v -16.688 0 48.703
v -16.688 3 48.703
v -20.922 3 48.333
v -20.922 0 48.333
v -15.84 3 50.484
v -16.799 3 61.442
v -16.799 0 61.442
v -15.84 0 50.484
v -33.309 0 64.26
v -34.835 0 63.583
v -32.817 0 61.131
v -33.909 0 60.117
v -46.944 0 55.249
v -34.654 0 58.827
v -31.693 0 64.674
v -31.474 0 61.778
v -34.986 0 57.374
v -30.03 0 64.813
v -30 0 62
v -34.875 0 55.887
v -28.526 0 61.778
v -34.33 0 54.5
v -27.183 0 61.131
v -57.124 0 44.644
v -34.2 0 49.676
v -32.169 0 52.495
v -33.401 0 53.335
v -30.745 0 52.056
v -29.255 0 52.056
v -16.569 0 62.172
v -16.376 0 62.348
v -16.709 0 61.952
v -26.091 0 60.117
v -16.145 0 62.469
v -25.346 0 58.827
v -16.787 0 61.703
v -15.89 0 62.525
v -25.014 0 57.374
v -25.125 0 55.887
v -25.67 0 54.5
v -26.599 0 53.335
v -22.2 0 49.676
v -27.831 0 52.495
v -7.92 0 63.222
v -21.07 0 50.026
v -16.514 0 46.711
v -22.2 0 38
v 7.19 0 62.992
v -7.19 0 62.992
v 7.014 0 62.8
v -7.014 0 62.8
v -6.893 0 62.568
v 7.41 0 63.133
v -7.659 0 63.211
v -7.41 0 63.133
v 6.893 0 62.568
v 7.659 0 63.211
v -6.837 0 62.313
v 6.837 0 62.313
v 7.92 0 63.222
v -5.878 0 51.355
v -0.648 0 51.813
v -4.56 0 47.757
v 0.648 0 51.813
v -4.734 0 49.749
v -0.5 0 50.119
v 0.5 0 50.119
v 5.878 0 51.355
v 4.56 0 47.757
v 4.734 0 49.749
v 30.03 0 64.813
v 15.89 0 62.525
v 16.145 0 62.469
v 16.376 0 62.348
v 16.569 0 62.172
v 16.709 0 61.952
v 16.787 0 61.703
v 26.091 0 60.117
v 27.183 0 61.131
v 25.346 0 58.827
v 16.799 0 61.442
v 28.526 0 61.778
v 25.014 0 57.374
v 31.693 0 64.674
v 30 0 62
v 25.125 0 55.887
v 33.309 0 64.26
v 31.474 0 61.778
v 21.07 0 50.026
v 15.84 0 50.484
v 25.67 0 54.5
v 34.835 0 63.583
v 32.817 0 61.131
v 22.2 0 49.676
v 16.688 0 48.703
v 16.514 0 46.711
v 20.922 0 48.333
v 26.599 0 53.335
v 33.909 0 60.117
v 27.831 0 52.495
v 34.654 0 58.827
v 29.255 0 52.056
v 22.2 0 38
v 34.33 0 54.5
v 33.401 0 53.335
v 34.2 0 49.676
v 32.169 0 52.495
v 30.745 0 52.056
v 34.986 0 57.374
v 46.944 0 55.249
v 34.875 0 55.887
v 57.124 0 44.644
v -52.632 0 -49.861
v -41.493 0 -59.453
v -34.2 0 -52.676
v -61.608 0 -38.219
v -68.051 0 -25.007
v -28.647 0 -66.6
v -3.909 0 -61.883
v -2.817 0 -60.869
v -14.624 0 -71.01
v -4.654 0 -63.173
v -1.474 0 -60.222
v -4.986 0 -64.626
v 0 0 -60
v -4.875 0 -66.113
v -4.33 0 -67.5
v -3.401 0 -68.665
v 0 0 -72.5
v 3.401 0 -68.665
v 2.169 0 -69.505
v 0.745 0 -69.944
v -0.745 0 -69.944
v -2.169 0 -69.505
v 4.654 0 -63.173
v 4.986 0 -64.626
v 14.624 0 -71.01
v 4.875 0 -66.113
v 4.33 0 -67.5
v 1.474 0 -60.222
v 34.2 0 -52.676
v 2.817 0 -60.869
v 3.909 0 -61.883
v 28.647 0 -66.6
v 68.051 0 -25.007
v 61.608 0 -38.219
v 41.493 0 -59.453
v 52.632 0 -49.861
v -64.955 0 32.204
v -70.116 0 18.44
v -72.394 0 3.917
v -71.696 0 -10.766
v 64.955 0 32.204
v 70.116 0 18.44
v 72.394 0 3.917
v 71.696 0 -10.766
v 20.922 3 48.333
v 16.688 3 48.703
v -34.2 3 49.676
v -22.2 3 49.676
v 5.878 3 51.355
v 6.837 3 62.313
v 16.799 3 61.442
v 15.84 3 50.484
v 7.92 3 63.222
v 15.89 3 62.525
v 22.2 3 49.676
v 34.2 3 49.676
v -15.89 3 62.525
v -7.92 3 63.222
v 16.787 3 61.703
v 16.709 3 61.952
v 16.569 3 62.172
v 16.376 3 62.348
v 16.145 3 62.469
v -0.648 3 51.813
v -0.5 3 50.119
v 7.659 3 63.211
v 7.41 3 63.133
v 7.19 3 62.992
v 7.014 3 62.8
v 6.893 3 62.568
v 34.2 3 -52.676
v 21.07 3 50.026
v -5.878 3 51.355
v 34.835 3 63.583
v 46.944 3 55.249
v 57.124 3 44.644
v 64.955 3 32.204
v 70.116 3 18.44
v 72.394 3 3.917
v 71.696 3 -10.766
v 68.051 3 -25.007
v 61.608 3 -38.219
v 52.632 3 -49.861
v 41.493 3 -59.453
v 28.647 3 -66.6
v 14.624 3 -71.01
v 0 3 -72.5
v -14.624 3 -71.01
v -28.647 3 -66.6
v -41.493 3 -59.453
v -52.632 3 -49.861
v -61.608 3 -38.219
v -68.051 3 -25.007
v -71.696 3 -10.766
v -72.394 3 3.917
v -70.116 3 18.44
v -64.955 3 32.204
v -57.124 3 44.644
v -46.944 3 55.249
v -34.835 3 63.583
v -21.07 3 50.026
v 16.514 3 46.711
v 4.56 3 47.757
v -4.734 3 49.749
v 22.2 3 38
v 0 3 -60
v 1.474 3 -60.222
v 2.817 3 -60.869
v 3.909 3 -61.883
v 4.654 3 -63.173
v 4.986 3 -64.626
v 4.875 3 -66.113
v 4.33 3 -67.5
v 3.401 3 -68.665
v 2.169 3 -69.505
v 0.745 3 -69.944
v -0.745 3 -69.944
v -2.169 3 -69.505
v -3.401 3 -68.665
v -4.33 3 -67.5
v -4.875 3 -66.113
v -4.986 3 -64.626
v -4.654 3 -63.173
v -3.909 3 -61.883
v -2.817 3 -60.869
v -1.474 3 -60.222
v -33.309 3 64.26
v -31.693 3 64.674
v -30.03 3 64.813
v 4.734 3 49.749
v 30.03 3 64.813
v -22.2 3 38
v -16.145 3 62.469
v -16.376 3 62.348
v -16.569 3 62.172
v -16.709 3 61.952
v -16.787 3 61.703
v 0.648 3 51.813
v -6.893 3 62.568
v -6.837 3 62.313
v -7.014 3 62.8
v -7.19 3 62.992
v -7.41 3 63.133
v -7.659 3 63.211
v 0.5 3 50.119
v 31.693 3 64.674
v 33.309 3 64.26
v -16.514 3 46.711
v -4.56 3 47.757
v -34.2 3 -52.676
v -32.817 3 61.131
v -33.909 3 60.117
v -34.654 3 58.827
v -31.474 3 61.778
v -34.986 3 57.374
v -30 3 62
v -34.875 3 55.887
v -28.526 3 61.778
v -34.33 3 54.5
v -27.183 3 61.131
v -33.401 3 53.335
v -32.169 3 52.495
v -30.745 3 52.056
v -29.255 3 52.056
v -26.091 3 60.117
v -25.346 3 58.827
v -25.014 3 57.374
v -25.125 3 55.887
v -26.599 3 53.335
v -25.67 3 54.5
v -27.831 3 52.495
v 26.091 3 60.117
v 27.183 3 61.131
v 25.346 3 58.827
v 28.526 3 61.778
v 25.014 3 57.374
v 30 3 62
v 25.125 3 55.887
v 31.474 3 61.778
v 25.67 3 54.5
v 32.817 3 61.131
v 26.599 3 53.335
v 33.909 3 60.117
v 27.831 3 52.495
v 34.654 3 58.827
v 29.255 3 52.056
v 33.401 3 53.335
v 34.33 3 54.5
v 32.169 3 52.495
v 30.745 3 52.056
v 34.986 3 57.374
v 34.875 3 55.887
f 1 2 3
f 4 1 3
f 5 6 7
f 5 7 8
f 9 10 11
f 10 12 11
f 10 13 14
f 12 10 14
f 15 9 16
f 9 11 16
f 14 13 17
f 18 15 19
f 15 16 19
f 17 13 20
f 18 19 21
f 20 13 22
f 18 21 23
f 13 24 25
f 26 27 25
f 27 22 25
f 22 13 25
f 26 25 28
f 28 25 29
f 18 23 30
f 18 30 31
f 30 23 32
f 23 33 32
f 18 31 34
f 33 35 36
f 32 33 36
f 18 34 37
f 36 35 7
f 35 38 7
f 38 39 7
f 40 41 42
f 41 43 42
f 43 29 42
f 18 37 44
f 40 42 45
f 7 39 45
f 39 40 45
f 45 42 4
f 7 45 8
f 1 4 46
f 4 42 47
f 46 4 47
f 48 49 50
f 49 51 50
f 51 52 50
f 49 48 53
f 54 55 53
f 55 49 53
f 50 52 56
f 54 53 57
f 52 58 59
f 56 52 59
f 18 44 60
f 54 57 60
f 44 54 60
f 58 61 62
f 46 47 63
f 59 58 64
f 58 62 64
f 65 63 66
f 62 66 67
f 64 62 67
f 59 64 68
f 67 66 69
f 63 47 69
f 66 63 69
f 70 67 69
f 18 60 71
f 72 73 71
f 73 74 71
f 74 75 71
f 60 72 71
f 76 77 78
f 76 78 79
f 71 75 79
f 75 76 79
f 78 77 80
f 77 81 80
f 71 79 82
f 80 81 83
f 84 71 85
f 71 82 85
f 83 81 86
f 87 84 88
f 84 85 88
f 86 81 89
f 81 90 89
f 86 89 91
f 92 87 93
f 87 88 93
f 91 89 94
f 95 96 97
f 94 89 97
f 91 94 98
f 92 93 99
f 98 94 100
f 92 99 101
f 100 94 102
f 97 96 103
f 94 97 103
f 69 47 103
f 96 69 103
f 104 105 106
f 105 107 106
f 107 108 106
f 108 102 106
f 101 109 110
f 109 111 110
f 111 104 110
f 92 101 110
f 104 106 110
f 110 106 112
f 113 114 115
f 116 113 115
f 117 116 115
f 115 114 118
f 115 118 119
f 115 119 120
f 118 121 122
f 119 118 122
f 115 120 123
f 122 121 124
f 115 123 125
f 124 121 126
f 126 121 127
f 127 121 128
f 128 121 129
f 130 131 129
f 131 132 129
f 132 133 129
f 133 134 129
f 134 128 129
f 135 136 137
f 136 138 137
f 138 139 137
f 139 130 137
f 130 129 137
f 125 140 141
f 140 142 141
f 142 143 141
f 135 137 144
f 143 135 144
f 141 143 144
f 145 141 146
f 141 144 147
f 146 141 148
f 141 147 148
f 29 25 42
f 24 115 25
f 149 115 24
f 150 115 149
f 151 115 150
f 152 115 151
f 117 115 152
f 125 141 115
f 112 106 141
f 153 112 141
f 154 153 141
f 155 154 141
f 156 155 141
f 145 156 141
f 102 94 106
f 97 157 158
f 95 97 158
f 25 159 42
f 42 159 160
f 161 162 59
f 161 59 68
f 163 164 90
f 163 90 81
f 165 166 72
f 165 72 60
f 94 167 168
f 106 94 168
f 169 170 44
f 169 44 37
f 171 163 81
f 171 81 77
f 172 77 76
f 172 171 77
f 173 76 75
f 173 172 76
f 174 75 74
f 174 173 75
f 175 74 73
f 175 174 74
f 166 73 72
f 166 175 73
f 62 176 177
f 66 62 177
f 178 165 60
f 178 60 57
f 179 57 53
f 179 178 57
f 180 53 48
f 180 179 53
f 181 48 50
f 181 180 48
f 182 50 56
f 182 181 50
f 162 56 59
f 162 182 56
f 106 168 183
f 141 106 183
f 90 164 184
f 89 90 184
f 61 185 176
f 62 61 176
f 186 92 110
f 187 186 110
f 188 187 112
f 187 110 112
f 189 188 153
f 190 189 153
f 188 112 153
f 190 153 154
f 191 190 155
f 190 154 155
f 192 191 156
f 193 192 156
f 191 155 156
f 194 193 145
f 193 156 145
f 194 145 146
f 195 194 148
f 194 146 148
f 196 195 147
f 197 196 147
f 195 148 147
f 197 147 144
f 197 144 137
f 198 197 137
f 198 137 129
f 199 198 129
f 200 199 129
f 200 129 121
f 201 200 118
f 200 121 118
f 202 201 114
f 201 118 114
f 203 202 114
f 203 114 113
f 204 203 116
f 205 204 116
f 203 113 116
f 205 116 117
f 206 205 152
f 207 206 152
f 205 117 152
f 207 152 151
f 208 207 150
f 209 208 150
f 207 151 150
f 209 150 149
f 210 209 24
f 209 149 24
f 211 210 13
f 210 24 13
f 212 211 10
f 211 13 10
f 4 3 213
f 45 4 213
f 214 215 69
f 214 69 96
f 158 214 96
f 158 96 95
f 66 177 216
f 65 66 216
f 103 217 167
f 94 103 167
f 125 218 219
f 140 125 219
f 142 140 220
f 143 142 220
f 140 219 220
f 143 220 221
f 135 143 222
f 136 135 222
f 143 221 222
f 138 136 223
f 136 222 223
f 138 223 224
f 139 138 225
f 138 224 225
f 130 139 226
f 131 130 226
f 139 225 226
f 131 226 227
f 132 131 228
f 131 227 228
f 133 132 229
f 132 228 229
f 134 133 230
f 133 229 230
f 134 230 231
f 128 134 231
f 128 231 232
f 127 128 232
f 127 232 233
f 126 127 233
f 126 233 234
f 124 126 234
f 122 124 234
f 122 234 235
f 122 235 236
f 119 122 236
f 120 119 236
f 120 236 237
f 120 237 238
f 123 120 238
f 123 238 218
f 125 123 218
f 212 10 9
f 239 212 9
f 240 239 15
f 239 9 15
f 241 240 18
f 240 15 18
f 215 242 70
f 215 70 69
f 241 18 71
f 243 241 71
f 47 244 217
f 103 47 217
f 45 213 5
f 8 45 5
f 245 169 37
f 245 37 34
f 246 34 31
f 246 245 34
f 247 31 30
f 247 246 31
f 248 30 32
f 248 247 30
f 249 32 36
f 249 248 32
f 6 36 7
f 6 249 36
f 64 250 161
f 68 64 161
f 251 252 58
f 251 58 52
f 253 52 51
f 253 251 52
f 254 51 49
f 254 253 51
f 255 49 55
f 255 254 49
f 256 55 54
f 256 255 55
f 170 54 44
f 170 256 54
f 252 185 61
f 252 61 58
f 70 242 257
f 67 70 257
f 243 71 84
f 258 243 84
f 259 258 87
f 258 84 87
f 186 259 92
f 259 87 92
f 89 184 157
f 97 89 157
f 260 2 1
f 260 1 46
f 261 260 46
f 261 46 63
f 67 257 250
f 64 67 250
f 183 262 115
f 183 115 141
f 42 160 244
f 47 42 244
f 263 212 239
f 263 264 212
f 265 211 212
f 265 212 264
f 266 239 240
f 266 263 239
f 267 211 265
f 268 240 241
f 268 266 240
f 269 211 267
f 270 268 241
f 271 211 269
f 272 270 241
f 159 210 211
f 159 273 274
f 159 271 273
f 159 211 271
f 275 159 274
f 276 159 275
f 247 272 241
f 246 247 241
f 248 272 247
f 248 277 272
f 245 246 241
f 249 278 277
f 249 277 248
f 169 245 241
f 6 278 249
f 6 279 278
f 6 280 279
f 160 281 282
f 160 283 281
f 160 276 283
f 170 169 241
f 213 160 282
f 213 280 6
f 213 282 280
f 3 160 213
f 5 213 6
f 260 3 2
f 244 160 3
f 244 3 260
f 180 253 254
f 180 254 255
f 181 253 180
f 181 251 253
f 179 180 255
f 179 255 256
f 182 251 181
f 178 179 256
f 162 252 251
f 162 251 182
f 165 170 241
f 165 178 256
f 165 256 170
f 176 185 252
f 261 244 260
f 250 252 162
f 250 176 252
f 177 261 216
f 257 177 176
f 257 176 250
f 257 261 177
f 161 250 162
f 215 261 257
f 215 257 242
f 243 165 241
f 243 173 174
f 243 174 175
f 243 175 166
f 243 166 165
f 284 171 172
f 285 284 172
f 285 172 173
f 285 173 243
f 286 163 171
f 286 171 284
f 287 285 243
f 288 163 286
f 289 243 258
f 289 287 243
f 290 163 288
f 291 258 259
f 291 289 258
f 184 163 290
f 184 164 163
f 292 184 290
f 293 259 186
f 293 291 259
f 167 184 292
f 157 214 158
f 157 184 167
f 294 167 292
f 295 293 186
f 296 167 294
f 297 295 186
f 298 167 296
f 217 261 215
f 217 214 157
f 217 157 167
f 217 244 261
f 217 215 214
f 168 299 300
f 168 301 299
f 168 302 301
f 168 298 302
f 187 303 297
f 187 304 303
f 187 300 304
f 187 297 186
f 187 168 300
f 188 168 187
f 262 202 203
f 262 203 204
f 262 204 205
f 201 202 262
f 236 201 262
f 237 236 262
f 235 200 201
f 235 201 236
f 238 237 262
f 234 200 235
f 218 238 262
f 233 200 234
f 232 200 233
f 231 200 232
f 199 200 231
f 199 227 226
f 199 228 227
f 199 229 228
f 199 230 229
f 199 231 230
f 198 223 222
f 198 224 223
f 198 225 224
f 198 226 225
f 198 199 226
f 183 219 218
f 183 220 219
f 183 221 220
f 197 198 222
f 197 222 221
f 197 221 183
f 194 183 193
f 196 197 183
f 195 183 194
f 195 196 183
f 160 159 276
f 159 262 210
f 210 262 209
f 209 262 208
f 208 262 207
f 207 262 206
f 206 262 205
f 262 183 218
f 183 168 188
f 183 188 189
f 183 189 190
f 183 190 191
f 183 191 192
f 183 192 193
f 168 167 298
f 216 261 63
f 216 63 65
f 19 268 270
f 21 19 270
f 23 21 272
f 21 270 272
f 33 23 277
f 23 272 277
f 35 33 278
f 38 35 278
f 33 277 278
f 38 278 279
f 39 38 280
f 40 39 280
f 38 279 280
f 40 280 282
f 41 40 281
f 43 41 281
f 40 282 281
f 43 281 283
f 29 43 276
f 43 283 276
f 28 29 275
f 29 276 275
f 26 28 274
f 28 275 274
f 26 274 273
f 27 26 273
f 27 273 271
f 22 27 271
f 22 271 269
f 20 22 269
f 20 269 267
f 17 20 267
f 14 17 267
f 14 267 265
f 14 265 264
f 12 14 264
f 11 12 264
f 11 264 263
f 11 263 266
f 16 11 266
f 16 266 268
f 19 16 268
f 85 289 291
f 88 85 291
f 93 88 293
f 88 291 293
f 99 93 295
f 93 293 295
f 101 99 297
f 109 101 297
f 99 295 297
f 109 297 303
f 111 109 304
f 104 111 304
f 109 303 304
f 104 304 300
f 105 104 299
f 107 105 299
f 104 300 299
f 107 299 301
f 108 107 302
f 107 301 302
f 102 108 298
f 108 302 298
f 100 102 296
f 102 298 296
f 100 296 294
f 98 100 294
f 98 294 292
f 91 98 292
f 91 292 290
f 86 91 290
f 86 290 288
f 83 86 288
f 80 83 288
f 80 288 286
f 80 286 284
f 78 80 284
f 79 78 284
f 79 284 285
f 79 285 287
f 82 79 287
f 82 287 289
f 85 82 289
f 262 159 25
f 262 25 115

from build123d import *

# Parameters (mm, degrees)
BOSS_EXTRUDE1_DEPTH = 3
CUT_EXTRUDE1_DEPTH  = 103.574363269
CUT_EXTRUDE3_DEPTH  = 103.574363269
CUT_EXTRUDE4_DEPTH  = 103.574363269
SKETCH6_W           = 68.4
SKETCH6_H           = 3
CUT_EXTRUDE5_DEPTH  = 103.574363269
SKETCH7_R           = 5
CUT_EXTRUDE6_DEPTH  = 103.574363269
SKETCH11_R          = 5
CUT_EXTRUDE10_DEPTH = 103.574363269


with BuildPart() as part:
    # Sketch1 → Boss-Extrude1 (new body)
    with BuildSketch(Plane(origin=(0, 0, 0), x_dir=(1, 0, 0), z_dir=(0, 1, 0))):
        with BuildLine():
            Line((-30.029977361, -64.812867647), (30.029977361, -64.812867647))
            ThreePointArc((30.029977361, -64.812867647), (32.509837414, -64.500503794), (34.834773739, -63.582926471))
            ThreePointArc((34.834773739, -63.582926471), (0, 72.5), (-34.834773739, -63.582926471))
            ThreePointArc((-34.834773739, -63.582926471), (-32.509837414, -64.500503794), (-30.029977361, -64.812867647))
        make_face()
    extrude(amount=BOSS_EXTRUDE1_DEPTH)

    # Sketch2 → Cut-Extrude1 (cut, through all)
    with BuildSketch(Plane(origin=(0, 3, 0), x_dir=(1, 0, 0), z_dir=(0, 1, 0))):
        Polygon((-22.2, -49.675685802), (-22.2, -38), (22.2, -38), (22.2, -49.675685802), (34.2, -49.675685802), (34.2, 49.675685802), (22.2, 49.675685802), (22.2, 44), (-22.2, 44), (-22.2, 49.675685802), (-34.2, 49.675685802), (-34.2, -49.675685802), align=None)
    extrude(amount=-CUT_EXTRUDE1_DEPTH, mode=Mode.SUBTRACT)

    # Sketch4 → Cut-Extrude3 (cut, through all)
    with BuildSketch(Plane(origin=(0, 3, 0), x_dir=(1, 0, 0), z_dir=(0, 1, 0))):
        Polygon((-21.070156074, -50.026174921), (-0.648164763, -51.812867647), (-0.5, -50.11933666), (-20.921991311, -48.332643934), align=None)
        Polygon((21.070156074, -50.026174921), (20.921991311, -48.332643934), (0.5, -50.11933666), (0.648164763, -51.812867647), align=None)
    extrude(amount=-CUT_EXTRUDE3_DEPTH, mode=Mode.SUBTRACT)

    # Sketch5 → Cut-Extrude4 (cut, through all)
    with BuildSketch(Plane(origin=(0, 3, 0), x_dir=(1, 0, 0), z_dir=(0, 1, 0))):
        with BuildLine():
            Line((5.878186928, -51.355299998), (15.840133909, -50.48374257))
            Line((15.840133909, -50.48374257), (16.798847079, -61.441884249))
            ThreePointArc((16.798847079, -61.441884249), (16.568696824, -62.171827602), (15.889808123, -62.52523469))
            Line((15.889808123, -62.52523469), (7.920250539, -63.222480632))
            ThreePointArc((7.920250539, -63.222480632), (7.190307186, -62.992330377), (6.836900098, -62.313441677))
            Line((6.836900098, -62.313441677), (5.878186928, -51.355299998))
        make_face()
        Polygon((16.688163844, -48.703055841), (4.733827467, -49.748924754), (4.559515981, -47.756535357), (16.513852358, -46.710666444), align=None)
        Polygon((-16.513852358, -46.710666444), (-4.559515981, -47.756535357), (-4.733827467, -49.748924754), (-16.688163844, -48.703055841), align=None)
        with BuildLine():
            Line((-7.920250539, -63.222480632), (-15.889808123, -62.52523469))
            ThreePointArc((-15.889808123, -62.52523469), (-16.568696824, -62.171827602), (-16.798847079, -61.441884249))
            Line((-16.798847079, -61.441884249), (-15.840133909, -50.48374257))
            Line((-15.840133909, -50.48374257), (-5.878186928, -51.355299998))
            Line((-5.878186928, -51.355299998), (-6.836900098, -62.313441677))
            ThreePointArc((-6.836900098, -62.313441677), (-7.190307186, -62.992330377), (-7.920250539, -63.222480632))
        make_face()
    extrude(amount=-CUT_EXTRUDE4_DEPTH, mode=Mode.SUBTRACT)

    # Sketch6 → Cut-Extrude5 (cut, through all)
    with BuildSketch(Plane(origin=(0, 3, 0), x_dir=(1, 0, 0), z_dir=(0, 1, 0))):
        with Locations((0, 51.175685802)):
            Rectangle(SKETCH6_W, SKETCH6_H)
    extrude(amount=-CUT_EXTRUDE5_DEPTH, mode=Mode.SUBTRACT)


with BuildPart() as cut_extrude5_kept_piece:
    # of the separate pieces the step leaves, the one the design keeps (cut_extrude5_pieces_kept)
    add(part.part.solids().sort_by_distance((-34.834773739, 0, 63.582926471))[0])

    # Sketch7 → Cut-Extrude6 (cut, through all)
    with BuildSketch(Plane(origin=(0, 3, 0), x_dir=(1, 0, 0), z_dir=(0, 1, 0))):
        with Locations(Location((-30, -57, 0), (0, 0, 270))):
            Circle(SKETCH7_R)
        with Locations(Location((30, -57, 0), (0, 0, 270))):
            Circle(SKETCH7_R)
    extrude(amount=-CUT_EXTRUDE6_DEPTH, mode=Mode.SUBTRACT)

    # Sketch11 → Cut-Extrude10 (cut, through all)
    with BuildSketch(Plane(origin=(0, 3, 0), x_dir=(1, 0, 0), z_dir=(0, 1, 0))):
        with Locations(Location((0, 65, 0), (0, 0, 270))):
            Circle(SKETCH11_R)
    extrude(amount=-CUT_EXTRUDE10_DEPTH, mode=Mode.SUBTRACT)


solid = cut_extrude5_kept_piece.part
